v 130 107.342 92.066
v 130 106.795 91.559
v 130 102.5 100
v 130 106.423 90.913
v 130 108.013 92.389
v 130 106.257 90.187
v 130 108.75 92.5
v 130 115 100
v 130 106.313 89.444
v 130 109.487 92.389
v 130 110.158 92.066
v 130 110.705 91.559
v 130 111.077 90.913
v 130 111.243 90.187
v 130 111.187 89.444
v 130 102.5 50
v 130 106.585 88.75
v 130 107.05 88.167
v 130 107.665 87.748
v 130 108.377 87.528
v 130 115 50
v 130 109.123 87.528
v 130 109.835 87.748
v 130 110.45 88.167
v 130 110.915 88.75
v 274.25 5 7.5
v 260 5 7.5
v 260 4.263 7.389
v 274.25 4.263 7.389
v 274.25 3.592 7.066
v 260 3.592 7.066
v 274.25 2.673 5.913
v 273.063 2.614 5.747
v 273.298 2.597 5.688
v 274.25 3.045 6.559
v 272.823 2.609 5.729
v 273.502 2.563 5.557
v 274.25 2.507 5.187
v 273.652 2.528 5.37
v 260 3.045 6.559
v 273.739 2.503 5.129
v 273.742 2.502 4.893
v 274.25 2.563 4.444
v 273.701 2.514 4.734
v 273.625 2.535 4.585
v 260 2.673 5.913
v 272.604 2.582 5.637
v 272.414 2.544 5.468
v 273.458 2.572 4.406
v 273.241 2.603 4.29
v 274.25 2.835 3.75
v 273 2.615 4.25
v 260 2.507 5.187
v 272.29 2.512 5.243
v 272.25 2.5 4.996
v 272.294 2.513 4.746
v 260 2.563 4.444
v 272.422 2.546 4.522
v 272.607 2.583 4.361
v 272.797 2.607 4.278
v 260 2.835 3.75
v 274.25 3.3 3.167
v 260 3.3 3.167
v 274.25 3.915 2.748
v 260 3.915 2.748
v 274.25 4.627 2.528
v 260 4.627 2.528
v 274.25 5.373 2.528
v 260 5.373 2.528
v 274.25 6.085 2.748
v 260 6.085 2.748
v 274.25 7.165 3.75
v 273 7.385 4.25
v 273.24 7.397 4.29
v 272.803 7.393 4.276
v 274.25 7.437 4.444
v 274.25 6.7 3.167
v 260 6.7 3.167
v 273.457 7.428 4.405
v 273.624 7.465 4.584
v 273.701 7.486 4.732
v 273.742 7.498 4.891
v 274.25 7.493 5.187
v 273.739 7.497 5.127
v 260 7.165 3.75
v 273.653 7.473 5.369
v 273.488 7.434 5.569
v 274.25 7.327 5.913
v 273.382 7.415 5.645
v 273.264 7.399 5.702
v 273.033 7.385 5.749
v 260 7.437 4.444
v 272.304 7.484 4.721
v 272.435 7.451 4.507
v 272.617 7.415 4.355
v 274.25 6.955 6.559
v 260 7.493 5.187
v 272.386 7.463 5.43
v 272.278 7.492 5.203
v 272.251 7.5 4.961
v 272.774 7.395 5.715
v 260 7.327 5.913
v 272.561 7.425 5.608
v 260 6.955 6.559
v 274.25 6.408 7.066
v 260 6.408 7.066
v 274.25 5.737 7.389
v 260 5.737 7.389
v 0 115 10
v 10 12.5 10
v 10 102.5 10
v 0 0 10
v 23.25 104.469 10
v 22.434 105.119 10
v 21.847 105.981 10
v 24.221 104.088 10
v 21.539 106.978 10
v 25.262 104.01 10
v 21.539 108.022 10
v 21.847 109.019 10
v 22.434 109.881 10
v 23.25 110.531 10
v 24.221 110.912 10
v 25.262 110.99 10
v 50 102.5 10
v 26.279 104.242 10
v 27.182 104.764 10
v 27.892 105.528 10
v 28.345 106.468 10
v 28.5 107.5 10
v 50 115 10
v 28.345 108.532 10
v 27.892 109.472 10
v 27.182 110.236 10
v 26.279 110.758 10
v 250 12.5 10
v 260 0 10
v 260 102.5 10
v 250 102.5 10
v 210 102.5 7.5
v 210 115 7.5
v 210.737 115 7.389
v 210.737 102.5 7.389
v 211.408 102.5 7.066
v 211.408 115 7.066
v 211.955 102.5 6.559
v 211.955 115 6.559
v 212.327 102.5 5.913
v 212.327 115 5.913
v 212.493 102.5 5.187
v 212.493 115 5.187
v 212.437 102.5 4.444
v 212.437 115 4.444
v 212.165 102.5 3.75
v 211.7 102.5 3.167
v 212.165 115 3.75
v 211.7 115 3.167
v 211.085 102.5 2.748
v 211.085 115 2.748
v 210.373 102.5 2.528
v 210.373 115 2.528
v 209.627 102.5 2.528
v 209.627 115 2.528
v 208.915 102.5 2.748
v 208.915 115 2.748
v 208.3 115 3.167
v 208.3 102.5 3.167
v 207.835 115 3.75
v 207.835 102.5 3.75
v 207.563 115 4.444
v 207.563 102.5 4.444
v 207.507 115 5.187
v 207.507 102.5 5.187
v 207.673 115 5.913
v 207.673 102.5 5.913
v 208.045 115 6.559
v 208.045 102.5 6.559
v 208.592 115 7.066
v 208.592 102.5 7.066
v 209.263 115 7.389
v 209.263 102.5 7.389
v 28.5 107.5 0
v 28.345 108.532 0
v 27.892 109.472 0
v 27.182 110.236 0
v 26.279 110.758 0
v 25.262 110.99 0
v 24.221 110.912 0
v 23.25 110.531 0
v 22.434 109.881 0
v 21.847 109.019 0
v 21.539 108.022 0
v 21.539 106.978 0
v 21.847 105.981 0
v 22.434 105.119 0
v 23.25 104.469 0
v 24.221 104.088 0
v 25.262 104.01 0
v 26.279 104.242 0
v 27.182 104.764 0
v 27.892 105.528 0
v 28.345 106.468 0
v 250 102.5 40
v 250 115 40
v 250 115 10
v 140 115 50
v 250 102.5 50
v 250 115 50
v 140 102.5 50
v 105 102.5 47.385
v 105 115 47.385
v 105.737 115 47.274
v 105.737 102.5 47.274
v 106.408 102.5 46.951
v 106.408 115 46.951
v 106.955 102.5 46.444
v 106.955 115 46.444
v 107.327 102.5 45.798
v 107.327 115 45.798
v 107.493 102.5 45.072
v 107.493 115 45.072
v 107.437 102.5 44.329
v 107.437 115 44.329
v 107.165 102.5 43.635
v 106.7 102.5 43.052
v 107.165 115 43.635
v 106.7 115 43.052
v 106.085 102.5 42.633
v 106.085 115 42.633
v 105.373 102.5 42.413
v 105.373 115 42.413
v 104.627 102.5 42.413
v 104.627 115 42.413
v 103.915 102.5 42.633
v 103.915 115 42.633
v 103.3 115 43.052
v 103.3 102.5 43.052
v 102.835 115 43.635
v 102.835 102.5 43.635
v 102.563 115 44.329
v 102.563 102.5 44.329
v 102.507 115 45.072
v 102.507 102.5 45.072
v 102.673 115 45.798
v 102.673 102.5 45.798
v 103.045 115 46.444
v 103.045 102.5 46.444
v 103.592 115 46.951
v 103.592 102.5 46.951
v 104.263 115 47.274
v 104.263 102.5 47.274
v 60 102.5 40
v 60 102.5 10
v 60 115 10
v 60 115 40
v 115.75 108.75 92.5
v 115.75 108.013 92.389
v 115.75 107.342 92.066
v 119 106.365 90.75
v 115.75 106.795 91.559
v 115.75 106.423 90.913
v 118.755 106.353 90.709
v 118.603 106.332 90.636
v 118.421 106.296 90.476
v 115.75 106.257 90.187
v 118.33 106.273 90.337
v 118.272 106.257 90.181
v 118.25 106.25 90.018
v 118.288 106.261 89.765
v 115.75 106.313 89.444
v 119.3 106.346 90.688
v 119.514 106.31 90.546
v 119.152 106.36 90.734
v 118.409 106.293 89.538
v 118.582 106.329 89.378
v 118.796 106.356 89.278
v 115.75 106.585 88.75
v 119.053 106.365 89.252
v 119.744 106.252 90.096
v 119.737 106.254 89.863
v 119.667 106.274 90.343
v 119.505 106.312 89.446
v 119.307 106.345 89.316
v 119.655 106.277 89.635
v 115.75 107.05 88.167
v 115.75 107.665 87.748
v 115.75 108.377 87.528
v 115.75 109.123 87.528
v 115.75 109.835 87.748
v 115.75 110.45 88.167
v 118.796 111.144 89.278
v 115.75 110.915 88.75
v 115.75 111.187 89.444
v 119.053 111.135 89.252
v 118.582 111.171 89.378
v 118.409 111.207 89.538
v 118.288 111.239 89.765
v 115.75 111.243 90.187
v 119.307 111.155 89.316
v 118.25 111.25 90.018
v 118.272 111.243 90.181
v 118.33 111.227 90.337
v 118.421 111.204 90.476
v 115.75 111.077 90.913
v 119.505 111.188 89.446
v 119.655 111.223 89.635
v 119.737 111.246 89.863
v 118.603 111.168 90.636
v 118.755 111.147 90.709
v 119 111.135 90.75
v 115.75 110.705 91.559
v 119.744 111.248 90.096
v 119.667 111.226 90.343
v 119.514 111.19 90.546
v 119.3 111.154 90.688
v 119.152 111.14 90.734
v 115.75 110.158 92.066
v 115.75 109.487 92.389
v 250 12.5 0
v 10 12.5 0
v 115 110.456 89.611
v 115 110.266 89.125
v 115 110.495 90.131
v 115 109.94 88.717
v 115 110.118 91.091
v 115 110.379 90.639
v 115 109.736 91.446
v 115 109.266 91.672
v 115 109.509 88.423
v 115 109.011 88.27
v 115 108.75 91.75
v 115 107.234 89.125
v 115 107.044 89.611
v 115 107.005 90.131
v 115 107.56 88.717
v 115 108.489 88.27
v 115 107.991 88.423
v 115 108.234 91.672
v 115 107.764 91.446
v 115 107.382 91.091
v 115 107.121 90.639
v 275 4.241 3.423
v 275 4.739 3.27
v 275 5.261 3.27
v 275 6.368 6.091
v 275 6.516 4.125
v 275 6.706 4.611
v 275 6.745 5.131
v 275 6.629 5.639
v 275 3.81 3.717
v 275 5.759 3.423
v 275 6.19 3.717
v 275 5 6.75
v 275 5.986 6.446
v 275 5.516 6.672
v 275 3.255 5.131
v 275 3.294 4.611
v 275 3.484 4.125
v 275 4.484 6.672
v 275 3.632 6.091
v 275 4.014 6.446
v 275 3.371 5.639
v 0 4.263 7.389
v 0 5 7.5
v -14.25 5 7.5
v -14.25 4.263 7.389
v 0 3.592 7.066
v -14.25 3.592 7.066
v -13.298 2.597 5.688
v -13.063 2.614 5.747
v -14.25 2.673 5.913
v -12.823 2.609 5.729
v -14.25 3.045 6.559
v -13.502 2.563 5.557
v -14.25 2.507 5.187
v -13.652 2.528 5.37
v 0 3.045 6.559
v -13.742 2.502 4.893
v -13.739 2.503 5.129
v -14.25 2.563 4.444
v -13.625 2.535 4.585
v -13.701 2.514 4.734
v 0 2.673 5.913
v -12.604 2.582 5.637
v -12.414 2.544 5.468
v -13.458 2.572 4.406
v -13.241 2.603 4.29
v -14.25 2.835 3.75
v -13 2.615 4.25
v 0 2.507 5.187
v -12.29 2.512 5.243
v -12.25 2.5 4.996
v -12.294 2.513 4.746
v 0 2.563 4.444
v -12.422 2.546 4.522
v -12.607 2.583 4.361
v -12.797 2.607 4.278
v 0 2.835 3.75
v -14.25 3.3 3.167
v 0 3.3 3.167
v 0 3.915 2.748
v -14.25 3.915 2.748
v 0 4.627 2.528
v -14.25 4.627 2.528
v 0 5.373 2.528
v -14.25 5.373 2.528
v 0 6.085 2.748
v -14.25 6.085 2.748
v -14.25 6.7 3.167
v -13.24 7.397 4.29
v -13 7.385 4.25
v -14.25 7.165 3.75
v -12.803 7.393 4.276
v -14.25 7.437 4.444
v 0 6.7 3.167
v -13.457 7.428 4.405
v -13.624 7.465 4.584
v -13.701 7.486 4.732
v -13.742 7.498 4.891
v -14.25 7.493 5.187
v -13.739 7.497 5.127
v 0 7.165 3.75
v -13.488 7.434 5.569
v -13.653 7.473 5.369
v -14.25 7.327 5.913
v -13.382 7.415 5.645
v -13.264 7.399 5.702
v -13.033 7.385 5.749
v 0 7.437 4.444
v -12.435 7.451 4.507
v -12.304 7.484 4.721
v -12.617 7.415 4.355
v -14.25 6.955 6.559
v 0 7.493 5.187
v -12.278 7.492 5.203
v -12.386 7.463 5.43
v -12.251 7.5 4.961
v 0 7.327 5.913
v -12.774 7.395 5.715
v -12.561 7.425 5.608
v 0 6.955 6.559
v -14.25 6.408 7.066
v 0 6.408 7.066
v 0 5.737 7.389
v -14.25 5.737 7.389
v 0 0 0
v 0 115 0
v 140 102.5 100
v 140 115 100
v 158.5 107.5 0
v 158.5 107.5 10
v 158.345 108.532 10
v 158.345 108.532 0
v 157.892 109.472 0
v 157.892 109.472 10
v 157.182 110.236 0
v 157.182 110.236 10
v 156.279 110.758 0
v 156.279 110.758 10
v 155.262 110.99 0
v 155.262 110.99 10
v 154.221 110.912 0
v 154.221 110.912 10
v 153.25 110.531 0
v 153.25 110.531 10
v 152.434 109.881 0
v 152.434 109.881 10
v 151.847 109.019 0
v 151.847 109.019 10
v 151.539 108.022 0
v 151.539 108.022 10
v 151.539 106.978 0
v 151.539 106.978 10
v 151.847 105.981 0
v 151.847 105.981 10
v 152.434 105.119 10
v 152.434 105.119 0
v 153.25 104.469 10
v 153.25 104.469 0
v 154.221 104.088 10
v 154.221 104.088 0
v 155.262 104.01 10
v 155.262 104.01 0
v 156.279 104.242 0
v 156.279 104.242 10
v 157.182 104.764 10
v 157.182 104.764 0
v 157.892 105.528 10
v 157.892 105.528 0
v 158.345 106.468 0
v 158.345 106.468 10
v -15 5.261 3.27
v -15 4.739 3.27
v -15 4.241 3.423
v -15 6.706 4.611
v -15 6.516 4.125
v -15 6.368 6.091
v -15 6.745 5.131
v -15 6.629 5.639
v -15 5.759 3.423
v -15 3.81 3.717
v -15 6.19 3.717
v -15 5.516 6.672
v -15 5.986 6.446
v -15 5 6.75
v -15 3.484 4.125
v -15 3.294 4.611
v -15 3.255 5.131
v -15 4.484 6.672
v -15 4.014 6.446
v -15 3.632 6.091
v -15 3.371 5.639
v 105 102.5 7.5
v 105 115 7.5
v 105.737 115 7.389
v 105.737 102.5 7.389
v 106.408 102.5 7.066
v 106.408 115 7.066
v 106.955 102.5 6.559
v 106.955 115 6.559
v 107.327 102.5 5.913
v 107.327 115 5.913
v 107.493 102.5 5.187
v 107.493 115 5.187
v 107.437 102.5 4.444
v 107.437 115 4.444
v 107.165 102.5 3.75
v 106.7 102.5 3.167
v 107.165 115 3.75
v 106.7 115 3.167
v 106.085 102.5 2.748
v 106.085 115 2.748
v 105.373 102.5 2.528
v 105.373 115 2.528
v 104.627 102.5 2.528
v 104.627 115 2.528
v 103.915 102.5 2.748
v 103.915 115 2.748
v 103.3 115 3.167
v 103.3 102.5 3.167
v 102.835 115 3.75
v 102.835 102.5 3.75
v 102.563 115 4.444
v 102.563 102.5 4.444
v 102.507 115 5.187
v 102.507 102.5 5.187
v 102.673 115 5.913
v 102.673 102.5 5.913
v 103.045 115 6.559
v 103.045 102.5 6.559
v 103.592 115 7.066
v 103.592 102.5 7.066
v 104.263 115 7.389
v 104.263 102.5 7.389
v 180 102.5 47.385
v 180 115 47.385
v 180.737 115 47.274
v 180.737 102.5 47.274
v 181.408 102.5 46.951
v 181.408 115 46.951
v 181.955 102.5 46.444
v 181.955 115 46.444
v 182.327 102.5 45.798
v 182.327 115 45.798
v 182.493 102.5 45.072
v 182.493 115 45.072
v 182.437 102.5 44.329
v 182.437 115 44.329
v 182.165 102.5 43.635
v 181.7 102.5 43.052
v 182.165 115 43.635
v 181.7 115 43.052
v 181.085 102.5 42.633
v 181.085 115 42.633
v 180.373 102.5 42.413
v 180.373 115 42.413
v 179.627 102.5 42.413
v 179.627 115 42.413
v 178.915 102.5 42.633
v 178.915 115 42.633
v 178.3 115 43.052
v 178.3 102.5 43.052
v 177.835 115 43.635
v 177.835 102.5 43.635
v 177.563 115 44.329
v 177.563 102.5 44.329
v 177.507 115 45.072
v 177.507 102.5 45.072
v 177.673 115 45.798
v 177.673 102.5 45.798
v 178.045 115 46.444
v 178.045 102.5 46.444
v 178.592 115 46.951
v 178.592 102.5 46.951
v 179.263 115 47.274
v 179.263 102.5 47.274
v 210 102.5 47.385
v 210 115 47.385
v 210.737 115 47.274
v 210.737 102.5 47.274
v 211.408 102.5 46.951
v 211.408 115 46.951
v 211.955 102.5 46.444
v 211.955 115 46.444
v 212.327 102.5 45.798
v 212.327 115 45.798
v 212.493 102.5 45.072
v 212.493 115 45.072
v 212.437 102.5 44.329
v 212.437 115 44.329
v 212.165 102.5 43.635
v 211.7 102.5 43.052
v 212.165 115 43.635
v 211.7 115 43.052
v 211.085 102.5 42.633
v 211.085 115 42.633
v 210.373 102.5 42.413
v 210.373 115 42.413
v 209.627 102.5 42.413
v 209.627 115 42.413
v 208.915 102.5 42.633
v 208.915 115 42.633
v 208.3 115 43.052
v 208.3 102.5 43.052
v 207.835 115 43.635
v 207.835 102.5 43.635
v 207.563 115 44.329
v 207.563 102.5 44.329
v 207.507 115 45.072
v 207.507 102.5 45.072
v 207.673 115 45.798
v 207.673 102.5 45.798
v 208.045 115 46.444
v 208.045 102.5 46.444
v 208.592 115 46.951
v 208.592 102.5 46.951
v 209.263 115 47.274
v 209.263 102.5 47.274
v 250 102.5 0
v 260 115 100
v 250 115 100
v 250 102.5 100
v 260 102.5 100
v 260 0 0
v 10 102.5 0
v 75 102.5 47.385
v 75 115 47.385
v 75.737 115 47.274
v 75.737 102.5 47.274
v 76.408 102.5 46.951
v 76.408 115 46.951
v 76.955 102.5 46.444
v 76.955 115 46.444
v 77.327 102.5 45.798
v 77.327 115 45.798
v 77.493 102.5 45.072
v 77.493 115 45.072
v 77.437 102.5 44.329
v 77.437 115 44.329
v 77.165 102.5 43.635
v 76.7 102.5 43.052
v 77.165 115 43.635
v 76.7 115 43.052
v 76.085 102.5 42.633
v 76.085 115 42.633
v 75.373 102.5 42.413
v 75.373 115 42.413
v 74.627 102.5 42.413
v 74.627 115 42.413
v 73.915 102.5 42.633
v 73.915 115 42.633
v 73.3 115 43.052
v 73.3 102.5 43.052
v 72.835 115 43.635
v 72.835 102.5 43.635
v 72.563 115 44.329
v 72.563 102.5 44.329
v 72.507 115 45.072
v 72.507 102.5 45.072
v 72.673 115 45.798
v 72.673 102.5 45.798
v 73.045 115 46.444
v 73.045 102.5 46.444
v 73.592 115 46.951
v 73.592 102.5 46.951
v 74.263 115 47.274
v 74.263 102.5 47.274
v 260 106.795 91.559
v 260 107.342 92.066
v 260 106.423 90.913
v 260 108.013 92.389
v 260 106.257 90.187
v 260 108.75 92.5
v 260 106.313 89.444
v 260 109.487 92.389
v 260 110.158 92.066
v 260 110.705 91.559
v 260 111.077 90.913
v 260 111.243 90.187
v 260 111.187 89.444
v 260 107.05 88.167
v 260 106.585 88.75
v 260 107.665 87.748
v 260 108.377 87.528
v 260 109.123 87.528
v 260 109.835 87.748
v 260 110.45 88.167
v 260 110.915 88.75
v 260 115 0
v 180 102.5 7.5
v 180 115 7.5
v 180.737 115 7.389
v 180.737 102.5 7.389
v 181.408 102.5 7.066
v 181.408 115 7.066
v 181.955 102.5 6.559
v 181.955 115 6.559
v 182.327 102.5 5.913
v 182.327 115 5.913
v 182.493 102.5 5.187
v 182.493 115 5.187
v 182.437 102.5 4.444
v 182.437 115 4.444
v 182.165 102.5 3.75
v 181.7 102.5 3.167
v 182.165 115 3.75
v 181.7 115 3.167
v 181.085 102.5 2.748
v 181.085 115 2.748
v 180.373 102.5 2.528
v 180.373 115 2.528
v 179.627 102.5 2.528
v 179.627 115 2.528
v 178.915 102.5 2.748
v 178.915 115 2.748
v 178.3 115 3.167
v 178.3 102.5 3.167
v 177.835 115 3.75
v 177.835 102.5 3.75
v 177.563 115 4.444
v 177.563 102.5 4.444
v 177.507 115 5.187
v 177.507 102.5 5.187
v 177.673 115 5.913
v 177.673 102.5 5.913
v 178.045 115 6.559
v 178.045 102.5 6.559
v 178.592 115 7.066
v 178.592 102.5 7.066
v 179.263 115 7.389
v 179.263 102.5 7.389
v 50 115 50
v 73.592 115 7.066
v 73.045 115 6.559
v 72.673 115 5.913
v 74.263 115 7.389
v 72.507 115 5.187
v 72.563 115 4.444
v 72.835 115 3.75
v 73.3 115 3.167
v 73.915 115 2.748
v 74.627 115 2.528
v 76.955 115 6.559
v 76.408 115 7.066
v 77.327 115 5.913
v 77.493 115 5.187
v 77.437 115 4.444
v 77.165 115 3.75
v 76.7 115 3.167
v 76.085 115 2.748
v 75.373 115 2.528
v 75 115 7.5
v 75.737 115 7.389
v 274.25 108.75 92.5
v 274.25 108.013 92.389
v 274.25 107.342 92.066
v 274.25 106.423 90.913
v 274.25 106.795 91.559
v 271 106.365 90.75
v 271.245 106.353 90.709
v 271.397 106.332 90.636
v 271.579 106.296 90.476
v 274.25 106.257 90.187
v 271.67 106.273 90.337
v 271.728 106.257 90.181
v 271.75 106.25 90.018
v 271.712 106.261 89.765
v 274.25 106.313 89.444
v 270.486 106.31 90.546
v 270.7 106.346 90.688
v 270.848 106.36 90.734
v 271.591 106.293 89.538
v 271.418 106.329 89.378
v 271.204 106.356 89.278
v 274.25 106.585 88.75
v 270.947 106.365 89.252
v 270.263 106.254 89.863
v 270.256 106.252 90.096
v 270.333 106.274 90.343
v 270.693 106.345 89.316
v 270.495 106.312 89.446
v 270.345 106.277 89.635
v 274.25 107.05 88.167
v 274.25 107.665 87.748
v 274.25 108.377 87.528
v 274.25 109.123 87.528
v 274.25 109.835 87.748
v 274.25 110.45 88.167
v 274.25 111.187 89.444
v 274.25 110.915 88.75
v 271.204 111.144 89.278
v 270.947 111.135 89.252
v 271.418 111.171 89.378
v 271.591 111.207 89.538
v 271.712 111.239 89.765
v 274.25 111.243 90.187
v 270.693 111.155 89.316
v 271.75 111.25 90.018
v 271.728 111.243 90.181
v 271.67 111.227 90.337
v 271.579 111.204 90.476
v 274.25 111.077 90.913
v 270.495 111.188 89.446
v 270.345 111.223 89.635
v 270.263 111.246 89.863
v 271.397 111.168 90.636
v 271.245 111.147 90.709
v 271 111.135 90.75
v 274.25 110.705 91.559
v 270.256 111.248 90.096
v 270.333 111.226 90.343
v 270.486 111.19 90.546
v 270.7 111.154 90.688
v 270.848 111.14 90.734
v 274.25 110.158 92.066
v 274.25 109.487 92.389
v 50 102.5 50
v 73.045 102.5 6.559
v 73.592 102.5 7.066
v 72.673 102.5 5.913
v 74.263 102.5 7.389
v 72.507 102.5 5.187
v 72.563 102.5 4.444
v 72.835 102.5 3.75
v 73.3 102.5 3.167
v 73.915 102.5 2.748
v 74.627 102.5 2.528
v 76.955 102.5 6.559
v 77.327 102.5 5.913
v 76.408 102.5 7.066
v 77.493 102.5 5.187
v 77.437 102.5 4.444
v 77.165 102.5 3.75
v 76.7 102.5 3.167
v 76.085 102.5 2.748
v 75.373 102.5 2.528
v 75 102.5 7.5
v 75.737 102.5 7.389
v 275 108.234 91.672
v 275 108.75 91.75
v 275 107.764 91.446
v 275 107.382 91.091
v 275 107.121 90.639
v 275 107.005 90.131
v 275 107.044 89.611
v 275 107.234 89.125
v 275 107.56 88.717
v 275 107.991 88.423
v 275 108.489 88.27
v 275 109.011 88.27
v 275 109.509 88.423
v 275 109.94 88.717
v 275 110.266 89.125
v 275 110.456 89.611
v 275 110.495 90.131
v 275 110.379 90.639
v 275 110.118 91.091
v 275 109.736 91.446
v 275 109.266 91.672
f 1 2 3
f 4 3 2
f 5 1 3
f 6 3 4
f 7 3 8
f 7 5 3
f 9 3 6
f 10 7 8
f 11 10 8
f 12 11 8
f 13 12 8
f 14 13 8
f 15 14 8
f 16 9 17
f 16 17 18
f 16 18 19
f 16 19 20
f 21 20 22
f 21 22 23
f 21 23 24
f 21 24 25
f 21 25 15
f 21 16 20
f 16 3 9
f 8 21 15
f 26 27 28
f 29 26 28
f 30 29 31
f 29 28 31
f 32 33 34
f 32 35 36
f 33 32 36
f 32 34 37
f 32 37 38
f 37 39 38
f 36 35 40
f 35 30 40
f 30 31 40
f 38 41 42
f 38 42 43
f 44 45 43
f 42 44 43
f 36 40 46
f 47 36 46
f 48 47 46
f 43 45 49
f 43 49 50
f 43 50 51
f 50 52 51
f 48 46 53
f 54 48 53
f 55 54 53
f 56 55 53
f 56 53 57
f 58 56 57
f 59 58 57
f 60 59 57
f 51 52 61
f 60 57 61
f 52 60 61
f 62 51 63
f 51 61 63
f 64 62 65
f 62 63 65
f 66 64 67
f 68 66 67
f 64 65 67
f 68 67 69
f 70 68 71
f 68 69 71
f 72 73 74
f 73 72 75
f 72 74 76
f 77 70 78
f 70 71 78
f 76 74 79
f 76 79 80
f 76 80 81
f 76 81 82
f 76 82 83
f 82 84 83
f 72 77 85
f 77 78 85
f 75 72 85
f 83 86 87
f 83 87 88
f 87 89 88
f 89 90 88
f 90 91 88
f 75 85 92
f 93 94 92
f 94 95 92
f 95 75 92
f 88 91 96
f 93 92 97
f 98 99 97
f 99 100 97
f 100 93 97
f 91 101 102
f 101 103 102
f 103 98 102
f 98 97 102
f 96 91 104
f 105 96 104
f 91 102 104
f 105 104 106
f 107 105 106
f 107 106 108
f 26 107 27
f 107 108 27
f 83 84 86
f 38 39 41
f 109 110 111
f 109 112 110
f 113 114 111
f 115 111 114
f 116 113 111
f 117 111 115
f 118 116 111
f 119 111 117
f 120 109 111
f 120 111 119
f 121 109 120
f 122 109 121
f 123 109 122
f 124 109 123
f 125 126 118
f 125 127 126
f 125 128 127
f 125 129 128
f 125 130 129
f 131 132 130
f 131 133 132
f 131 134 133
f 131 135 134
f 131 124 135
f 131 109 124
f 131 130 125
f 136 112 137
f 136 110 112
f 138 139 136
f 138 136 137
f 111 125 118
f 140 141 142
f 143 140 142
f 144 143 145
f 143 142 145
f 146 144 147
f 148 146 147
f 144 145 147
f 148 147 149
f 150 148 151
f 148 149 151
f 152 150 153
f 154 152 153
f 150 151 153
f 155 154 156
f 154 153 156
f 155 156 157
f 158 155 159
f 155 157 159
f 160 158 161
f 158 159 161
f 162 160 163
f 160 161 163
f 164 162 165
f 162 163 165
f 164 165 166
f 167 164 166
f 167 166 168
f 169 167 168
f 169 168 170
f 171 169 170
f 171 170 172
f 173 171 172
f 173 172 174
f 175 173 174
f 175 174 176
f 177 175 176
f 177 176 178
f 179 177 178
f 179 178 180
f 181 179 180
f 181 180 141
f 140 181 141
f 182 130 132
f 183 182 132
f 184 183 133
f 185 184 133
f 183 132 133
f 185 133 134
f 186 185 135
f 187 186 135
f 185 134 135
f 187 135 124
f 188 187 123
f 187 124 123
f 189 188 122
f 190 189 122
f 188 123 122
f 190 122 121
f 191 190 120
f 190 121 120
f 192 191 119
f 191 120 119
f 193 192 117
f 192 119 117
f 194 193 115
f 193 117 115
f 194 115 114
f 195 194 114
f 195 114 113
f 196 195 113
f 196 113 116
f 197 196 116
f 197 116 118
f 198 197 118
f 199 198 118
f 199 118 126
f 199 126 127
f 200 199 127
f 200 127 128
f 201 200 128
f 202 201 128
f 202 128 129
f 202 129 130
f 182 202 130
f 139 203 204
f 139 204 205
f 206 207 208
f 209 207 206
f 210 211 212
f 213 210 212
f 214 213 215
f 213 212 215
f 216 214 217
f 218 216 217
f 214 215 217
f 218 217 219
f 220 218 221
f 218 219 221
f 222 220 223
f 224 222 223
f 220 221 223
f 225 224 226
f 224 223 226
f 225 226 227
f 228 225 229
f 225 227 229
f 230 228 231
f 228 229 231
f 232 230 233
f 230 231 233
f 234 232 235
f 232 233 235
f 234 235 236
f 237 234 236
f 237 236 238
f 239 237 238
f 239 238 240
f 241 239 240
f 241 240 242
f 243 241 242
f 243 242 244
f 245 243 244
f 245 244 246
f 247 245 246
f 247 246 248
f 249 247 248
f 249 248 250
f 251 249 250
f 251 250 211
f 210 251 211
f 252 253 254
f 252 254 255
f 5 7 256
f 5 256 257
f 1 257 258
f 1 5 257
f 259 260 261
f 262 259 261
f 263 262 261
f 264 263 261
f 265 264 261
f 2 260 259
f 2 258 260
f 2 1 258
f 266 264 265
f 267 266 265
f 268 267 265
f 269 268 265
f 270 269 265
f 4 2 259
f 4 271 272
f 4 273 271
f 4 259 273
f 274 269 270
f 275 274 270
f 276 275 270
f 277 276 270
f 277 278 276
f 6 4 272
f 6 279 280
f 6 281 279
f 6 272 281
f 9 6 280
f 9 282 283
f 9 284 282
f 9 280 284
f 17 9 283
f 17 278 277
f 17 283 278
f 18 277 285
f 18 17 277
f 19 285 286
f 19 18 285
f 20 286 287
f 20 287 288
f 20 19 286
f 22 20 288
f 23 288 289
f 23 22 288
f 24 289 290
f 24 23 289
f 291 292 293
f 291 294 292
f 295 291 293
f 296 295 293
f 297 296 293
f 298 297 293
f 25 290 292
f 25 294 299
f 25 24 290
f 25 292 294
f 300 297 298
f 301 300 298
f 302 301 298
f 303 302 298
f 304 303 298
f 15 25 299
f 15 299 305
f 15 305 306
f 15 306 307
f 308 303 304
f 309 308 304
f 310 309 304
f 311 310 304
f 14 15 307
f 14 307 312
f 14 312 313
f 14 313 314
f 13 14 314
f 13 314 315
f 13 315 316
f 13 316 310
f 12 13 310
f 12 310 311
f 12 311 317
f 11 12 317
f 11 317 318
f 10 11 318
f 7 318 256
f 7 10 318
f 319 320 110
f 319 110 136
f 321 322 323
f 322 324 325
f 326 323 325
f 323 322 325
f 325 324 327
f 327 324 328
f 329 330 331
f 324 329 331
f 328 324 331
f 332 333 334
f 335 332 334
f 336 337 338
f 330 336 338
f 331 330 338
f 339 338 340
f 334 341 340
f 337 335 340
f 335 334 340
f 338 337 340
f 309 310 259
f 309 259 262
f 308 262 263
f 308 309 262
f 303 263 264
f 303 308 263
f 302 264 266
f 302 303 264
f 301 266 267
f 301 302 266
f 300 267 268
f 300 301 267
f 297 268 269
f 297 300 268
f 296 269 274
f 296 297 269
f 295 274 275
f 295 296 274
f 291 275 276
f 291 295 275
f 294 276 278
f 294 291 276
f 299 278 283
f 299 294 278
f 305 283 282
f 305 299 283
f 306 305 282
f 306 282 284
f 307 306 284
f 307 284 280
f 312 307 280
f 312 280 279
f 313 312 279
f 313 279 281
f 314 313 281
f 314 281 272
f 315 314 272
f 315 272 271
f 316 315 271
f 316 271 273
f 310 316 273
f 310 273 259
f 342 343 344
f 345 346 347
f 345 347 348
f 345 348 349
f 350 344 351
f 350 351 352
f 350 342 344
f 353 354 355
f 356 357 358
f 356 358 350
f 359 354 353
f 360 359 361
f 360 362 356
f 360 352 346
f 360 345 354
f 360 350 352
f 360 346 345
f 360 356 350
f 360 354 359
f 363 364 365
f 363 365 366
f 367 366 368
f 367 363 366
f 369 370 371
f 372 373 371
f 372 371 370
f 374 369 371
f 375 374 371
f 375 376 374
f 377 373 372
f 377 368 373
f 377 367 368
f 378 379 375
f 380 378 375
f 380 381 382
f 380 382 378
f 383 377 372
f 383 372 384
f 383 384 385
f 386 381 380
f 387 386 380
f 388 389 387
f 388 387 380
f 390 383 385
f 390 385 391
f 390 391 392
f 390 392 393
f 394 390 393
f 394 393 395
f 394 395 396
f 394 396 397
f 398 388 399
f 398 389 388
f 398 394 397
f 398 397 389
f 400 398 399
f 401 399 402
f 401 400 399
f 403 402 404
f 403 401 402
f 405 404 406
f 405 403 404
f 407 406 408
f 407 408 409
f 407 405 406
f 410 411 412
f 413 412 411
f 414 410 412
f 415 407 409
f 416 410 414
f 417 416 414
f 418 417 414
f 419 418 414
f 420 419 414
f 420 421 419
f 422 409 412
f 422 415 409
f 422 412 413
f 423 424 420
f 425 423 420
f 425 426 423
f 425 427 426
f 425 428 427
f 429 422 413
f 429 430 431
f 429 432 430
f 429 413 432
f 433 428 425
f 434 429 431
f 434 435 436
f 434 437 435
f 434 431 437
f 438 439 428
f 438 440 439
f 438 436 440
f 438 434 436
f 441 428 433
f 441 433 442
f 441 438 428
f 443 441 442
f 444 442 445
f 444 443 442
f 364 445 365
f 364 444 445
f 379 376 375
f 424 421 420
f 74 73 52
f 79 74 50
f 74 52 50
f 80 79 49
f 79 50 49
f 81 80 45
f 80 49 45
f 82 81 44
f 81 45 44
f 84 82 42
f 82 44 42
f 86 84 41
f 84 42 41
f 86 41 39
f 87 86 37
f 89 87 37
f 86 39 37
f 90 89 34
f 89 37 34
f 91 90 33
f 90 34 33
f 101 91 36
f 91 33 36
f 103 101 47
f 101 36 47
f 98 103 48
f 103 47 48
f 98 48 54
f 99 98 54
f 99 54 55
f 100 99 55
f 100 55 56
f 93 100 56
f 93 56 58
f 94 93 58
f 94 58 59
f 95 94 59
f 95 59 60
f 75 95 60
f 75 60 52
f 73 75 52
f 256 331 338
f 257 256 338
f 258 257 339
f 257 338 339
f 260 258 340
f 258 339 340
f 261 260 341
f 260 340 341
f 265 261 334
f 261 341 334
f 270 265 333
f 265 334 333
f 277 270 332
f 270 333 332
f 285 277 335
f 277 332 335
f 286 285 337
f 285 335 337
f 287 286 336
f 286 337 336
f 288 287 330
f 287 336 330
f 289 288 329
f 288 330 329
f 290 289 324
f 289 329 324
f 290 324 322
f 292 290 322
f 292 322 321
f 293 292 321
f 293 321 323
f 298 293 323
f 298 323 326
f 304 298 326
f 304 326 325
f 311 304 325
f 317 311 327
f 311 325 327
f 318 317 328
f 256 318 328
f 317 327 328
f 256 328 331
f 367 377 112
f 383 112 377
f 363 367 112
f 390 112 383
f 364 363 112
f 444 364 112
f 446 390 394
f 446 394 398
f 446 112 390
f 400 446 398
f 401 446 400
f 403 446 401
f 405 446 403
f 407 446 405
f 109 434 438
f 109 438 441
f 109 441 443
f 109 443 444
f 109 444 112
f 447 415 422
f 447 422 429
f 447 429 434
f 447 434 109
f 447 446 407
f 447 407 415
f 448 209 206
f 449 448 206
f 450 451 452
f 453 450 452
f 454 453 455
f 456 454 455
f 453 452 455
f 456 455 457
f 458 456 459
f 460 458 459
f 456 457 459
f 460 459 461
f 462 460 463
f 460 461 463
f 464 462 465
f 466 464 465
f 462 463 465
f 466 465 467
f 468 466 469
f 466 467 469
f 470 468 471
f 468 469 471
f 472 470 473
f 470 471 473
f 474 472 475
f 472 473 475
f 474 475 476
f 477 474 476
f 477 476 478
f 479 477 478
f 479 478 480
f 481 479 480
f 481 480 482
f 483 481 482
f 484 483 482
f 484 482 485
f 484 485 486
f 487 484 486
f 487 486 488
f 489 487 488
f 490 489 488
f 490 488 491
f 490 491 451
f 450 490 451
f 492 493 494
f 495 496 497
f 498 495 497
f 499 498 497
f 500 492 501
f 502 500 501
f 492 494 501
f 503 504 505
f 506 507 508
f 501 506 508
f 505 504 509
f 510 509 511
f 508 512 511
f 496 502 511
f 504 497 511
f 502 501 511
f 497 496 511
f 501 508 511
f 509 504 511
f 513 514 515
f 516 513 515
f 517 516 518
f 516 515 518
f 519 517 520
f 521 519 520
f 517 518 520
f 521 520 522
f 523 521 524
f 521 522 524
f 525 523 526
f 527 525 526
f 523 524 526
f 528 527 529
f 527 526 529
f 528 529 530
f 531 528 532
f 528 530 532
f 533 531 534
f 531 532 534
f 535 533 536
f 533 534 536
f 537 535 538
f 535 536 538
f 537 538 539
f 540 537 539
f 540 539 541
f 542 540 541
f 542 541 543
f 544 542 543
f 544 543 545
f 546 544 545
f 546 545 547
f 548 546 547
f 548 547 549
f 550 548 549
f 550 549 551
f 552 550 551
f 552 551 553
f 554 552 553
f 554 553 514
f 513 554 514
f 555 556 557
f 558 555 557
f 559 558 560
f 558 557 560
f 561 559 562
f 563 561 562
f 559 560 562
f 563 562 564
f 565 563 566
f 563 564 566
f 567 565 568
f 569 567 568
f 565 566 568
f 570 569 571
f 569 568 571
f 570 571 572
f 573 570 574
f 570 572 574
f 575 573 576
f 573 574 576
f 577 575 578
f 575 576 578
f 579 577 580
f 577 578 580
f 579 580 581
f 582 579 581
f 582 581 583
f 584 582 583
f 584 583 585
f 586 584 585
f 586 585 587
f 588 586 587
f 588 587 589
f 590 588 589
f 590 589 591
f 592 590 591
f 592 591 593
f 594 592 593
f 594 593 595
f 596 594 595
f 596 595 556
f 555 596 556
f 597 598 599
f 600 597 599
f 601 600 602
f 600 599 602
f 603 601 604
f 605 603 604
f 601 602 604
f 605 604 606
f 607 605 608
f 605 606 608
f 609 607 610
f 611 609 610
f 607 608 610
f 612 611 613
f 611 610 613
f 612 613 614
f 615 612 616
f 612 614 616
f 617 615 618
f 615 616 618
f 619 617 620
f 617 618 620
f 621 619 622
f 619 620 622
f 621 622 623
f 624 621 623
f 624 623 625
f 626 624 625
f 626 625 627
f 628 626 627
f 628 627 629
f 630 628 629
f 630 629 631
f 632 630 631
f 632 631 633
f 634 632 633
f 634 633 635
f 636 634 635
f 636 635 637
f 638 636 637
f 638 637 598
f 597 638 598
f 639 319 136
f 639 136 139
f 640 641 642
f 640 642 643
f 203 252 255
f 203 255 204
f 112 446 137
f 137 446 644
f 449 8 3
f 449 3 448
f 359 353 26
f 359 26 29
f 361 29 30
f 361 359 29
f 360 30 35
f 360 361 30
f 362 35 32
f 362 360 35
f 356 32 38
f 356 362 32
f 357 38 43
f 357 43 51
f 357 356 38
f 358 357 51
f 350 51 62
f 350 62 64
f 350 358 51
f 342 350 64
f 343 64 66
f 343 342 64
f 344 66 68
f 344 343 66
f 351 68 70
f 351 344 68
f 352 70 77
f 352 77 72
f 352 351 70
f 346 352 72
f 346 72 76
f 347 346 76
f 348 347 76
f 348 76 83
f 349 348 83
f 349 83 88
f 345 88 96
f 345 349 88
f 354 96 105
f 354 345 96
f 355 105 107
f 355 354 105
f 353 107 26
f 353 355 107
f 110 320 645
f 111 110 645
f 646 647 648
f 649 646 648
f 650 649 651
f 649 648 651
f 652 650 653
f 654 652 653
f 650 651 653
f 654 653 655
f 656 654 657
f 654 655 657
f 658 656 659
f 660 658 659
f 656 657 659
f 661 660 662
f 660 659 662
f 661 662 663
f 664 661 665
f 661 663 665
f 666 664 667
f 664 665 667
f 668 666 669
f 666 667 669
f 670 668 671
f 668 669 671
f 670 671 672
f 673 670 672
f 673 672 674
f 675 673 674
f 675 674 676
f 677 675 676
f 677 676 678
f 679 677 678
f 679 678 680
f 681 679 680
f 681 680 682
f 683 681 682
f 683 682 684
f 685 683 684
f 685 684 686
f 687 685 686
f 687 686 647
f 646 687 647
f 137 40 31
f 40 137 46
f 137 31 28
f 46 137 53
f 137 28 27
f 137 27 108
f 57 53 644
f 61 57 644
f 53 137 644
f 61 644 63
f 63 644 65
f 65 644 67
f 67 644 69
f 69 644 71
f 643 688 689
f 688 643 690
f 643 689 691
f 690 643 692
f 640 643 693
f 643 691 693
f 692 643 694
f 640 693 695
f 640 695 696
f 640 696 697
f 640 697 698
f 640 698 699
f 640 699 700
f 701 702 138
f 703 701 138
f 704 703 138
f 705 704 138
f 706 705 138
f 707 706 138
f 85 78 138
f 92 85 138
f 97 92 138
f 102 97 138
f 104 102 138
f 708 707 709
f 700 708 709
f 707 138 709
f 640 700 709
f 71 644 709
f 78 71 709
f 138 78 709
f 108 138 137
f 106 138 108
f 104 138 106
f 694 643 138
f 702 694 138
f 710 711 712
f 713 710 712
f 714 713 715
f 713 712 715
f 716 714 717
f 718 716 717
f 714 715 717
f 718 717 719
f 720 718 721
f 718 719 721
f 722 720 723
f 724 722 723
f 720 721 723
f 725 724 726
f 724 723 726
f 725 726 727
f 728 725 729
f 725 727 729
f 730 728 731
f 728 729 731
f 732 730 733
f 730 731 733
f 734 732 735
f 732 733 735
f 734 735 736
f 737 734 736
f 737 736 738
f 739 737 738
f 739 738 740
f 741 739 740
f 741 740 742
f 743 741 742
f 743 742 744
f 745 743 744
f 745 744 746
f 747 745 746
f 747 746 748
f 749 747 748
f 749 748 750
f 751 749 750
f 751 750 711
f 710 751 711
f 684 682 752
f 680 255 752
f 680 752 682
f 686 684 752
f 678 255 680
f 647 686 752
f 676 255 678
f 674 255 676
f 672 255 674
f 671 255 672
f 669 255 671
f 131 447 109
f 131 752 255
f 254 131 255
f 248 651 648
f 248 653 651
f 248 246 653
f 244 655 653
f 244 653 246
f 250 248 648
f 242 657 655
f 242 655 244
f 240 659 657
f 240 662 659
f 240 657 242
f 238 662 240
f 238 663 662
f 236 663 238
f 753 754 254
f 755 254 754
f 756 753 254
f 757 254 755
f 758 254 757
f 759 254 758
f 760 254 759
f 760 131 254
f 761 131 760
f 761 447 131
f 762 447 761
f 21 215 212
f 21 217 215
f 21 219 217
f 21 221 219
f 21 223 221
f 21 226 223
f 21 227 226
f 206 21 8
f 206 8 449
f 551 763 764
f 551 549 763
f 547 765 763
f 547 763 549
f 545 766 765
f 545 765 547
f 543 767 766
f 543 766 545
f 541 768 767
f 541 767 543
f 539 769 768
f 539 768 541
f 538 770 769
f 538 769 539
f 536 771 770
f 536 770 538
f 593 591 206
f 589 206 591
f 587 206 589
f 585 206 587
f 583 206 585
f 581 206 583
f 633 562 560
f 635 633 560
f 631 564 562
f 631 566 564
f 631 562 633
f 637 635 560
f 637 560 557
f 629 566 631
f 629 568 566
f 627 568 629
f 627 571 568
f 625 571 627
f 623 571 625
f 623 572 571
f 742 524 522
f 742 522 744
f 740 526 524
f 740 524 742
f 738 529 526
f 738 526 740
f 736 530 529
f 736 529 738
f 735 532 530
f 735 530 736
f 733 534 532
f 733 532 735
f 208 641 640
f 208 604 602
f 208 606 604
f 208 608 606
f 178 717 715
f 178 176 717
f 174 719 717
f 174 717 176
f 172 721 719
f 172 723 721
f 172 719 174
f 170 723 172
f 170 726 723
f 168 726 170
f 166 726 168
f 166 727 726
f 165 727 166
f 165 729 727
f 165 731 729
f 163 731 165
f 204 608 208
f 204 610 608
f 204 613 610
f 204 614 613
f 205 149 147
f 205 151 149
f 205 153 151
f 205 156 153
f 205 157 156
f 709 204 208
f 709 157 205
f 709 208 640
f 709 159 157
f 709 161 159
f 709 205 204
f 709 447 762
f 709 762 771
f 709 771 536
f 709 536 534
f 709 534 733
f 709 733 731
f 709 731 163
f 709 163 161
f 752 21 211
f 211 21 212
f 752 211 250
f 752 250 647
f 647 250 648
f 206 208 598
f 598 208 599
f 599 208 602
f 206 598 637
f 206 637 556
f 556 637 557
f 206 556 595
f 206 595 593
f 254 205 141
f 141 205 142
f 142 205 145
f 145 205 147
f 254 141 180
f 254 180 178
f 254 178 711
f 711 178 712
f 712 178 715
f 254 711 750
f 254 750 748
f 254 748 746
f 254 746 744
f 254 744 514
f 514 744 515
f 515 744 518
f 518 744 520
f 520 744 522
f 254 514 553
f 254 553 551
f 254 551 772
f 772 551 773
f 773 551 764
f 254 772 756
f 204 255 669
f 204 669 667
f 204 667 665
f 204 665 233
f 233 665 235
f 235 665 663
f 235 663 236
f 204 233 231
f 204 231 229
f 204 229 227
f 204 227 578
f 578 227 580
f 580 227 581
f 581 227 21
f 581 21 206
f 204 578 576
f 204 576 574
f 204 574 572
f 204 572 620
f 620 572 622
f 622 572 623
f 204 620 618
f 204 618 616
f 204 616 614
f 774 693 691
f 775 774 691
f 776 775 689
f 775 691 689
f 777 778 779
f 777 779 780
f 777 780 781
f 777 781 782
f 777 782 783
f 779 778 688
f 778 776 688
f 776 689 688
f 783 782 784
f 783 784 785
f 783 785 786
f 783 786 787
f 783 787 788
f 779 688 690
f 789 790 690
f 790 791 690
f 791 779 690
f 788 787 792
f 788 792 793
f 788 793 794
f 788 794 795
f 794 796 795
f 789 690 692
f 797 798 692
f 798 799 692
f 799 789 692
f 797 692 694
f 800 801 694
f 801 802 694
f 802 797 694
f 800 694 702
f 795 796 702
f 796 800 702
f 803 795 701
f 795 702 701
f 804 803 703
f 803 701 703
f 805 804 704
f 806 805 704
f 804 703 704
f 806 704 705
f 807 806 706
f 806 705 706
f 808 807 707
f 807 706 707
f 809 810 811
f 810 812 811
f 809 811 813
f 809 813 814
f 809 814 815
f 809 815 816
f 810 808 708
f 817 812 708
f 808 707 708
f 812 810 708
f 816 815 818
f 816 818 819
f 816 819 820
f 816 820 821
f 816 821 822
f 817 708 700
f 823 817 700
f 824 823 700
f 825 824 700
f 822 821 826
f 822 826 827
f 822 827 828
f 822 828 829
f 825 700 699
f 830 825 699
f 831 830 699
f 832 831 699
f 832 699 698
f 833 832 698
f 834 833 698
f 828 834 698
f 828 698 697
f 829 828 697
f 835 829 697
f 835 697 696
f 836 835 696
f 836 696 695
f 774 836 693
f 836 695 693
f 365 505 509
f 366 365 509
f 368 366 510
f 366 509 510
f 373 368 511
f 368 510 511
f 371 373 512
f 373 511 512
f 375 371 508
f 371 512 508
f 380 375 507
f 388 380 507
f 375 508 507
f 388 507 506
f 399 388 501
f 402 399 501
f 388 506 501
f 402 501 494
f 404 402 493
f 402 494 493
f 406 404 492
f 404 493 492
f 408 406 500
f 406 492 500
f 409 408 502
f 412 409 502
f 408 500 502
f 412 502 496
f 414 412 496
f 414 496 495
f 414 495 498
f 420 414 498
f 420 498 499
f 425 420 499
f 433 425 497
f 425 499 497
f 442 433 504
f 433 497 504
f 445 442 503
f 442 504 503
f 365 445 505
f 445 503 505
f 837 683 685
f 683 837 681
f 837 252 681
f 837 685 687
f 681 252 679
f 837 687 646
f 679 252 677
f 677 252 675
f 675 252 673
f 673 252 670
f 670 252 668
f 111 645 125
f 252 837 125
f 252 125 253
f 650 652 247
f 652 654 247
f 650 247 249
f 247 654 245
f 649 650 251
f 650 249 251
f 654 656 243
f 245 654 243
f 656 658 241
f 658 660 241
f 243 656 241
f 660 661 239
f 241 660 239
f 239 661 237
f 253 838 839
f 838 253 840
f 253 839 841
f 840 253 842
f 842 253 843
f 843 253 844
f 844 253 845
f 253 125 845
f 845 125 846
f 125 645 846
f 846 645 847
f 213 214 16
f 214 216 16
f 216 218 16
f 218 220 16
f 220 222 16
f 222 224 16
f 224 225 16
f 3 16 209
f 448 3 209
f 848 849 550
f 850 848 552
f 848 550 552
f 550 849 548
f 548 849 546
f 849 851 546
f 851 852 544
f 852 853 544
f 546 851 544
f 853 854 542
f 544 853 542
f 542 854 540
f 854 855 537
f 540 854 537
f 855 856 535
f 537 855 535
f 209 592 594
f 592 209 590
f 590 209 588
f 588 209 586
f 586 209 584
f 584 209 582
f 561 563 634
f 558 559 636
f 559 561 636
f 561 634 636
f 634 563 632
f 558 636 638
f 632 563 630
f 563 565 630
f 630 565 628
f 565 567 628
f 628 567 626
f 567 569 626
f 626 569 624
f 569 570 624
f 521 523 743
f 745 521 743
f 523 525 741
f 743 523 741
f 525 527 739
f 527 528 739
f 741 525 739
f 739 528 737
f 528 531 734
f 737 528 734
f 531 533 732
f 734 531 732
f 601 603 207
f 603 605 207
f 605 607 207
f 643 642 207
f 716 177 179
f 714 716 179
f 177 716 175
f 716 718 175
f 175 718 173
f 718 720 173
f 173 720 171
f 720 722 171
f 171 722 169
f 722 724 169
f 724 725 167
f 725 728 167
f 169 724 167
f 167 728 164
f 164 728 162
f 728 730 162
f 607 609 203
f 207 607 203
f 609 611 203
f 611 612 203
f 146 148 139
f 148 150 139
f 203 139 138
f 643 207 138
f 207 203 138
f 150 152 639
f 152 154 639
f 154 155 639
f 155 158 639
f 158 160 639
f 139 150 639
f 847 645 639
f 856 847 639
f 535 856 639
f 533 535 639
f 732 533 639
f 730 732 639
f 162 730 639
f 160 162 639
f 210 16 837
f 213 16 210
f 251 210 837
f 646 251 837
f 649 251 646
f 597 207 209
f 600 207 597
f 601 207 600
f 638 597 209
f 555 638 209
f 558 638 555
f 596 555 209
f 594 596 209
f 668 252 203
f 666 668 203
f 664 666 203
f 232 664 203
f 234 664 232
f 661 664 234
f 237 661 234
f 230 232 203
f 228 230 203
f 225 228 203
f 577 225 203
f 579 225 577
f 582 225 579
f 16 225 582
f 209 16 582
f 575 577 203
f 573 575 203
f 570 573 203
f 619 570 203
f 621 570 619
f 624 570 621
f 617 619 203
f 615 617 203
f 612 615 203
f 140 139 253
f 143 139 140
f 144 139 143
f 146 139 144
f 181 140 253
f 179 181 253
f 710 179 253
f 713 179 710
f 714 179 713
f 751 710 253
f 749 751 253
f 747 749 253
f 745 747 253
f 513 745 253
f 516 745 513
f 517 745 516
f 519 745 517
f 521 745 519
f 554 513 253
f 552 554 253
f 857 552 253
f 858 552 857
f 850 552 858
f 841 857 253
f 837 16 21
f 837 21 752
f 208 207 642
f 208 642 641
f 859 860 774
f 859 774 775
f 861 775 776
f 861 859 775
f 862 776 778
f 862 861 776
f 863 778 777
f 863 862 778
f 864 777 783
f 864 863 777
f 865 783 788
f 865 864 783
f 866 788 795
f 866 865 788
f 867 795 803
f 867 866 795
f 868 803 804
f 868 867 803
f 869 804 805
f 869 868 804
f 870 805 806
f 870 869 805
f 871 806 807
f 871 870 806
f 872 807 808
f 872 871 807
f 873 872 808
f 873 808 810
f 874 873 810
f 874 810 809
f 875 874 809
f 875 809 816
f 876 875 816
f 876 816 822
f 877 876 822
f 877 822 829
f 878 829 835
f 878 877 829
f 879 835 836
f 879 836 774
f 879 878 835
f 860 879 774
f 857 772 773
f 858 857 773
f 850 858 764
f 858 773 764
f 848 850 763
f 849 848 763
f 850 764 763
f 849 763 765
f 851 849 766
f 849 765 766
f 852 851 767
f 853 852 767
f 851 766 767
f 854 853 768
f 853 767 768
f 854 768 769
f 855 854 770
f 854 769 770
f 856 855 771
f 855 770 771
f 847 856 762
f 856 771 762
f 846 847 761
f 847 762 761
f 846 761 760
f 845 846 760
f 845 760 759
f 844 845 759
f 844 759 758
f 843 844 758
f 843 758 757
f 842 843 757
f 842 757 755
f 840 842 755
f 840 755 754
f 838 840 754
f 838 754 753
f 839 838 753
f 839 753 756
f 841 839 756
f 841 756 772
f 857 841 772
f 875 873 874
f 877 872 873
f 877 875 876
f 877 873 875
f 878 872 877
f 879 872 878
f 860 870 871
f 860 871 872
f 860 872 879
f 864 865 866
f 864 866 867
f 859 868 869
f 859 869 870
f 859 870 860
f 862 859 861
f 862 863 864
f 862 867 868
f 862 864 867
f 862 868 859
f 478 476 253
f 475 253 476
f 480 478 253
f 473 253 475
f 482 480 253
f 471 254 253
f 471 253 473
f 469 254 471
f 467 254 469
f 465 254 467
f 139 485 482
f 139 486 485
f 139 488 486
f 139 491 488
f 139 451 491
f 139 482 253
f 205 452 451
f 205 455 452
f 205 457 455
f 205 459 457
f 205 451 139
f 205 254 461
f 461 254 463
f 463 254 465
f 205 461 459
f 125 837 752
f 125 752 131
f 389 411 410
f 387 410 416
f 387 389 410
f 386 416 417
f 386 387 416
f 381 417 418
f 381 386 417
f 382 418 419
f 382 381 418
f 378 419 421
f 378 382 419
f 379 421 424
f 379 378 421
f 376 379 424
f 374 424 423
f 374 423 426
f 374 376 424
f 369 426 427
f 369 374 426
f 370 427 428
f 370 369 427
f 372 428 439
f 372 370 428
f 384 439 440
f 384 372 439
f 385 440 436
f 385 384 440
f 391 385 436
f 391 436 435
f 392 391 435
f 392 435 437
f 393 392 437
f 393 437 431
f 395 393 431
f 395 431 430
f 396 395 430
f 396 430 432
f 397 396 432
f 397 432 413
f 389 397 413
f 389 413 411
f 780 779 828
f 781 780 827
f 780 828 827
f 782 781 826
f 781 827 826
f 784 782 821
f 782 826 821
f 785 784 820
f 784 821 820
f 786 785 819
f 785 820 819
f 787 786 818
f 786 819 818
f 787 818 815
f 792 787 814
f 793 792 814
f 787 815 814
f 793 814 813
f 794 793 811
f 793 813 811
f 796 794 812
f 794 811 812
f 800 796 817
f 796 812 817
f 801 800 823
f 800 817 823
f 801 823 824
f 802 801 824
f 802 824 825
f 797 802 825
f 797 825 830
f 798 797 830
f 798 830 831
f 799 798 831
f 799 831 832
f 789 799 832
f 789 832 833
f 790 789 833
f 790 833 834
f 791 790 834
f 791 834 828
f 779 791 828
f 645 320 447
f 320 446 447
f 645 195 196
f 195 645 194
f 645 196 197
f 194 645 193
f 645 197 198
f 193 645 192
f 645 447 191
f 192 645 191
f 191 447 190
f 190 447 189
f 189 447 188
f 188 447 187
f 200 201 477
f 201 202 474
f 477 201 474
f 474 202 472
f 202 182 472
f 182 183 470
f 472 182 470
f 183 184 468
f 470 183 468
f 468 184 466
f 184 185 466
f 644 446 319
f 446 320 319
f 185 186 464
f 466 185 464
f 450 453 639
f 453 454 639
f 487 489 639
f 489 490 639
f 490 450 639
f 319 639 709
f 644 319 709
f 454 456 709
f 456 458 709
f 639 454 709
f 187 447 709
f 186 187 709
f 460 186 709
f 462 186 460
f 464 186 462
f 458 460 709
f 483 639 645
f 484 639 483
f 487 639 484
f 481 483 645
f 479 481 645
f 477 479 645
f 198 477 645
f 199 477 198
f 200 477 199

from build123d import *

# Parameters (mm, degrees)
IZIM1_W                     = 260
IZIM1_H                     = 115
IZIM1_W_2                   = 240
IZIM1_H_2                   = 90
Y_KSEKLIK_EKSTR_ZYON1_DEPTH = 10
Y_KSEKLIK_EKSTR_ZYON2_START = -12.5
Y_KSEKLIK_EKSTR_ZYON2_DEPTH = 12.5
IZIM3_W                     = 10
IZIM3_H                     = 12.5
Y_KSEKLIK_EKSTR_ZYON3_DEPTH = 50
IZIM4_R                     = 2.5
Y_KSEKLIK_EKSTR_ZYON4_DEPTH = 15
IZIM5_R                     = 0.75
KES_EKSTR_ZYON1_DEPTH       = 15
PAH1_SIZE                   = 0.75
IZIM6_R                     = 2.5
Y_KSEKLIK_EKSTR_ZYON5_DEPTH = 15
IZIM7_R                     = 0.75
KES_EKSTR_ZYON2_DEPTH       = 15
PAH2_SIZE                   = 0.75
PAH3_SIZE                   = 0.75
IZIM8_R                     = 2.5
KES_EKSTR_ZYON3_DEPTH       = 15
IZIM9_R                     = 3.5
KES_EKSTR_ZYON4_DEPTH       = 15


with BuildPart() as part:
    # Çizim1 → Yükseklik-Ekstrüzyon1 (new body)
    with BuildSketch(Plane.XY):
        with Locations((130, 57.5)):
            Rectangle(IZIM1_W, IZIM1_H)
        with Locations((130, 57.5)):
            Rectangle(IZIM1_W_2, IZIM1_H_2, mode=Mode.SUBTRACT)
    extrude(amount=Y_KSEKLIK_EKSTR_ZYON1_DEPTH)

    # Çizim2 → Yükseklik-Ekstrüzyon2 (add)
    with BuildSketch(Plane(origin=(0, 115, 0), x_dir=(1, 0, 0), z_dir=(0, 1, 0)).offset(Y_KSEKLIK_EKSTR_ZYON2_START)):
        Polygon((260, -10), (260, -50), (50, -50), (50, -10), (60, -10), (60, -40), (250, -40), (250, -10), align=None)
    extrude(amount=Y_KSEKLIK_EKSTR_ZYON2_DEPTH)

    # Çizim3 → Yükseklik-Ekstrüzyon3 (add)
    with BuildSketch(Plane.XY.offset(50)):
        with Locations((255, 108.75)):
            Rectangle(IZIM3_W, IZIM3_H)
        with Locations((135, 108.75)):
            Rectangle(IZIM3_W, IZIM3_H)
    extrude(amount=Y_KSEKLIK_EKSTR_ZYON3_DEPTH)

    # Çizim4 → Yükseklik-Ekstrüzyon4 (add)
    with BuildSketch(Plane(origin=(260, 0, 0), x_dir=(0, 0, -1), z_dir=(1, 0, 0))):
        with Locations(Location((-90, 108.75, 0), (0, 0, 180))):
            Circle(IZIM4_R)
    y_kseklik_ekstr_zyon4 = extrude(amount=Y_KSEKLIK_EKSTR_ZYON4_DEPTH)

    # Çizim5 → Kes-Ekstrüzyon1 (cut)
    with BuildSketch(Plane(origin=(0, 115, 0), x_dir=(1, 0, 0), z_dir=(0, 1, 0))):
        with Locations(Location((271, -90, 0), (0, 0, 270))):
            Circle(IZIM5_R)
    kes_ekstr_zyon1 = extrude(amount=-KES_EKSTR_ZYON1_DEPTH, mode=Mode.SUBTRACT)

    # Aynalama1: Yükseklik-Ekstrüzyon4, Kes-Ekstrüzyon1 across plane
    add(y_kseklik_ekstr_zyon4.mirror(Plane(origin=(195, 0, 0), x_dir=(0, 0, 1), z_dir=(1, 0, 0))))
    add(kes_ekstr_zyon1.mirror(Plane(origin=(195, 0, 0), x_dir=(0, 0, 1), z_dir=(1, 0, 0))), mode=Mode.SUBTRACT)

    # Pah1
    pah1_edges = [part.edges().sort_by_distance(p)[0] for p in [
        (275, 108.75, 87.5),
        (115, 108.75, 87.5),
    ]]
    chamfer(pah1_edges, length=PAH1_SIZE)

    # Çizim6 → Yükseklik-Ekstrüzyon5 (add)
    with BuildSketch(Plane(origin=(260, 0, 0), x_dir=(0, 0, -1), z_dir=(1, 0, 0))):
        with Locations(Location((-5, 5, 0), (0, 0, 180))):
            Circle(IZIM6_R)
    y_kseklik_ekstr_zyon5 = extrude(amount=Y_KSEKLIK_EKSTR_ZYON5_DEPTH)

    # Çizim7 → Kes-Ekstrüzyon2 (cut)
    with BuildSketch(Plane.XZ):
        with Locations(Location((273, 5, 0), (0, 0, 270))):
            Circle(IZIM7_R)
    kes_ekstr_zyon2 = extrude(amount=-KES_EKSTR_ZYON2_DEPTH, mode=Mode.SUBTRACT)

    # Pah2
    pah2_edges = [part.edges().sort_by_distance(p)[0] for p in [
        (275, 5, 2.5),
    ]]
    chamfer(pah2_edges, length=PAH2_SIZE)

    # Aynalama5: Yükseklik-Ekstrüzyon5, Kes-Ekstrüzyon2 across plane
    add(y_kseklik_ekstr_zyon5.mirror(Plane(origin=(130, 0, 0), x_dir=(0, 0, 1), z_dir=(1, 0, 0))))
    add(kes_ekstr_zyon2.mirror(Plane(origin=(130, 0, 0), x_dir=(0, 0, 1), z_dir=(1, 0, 0))), mode=Mode.SUBTRACT)

    # Pah3
    pah3_edges = [part.edges().sort_by_distance(p)[0] for p in [
        (-15, 5, 2.5),
    ]]
    chamfer(pah3_edges, length=PAH3_SIZE)

    # Çizim8 → Kes-Ekstrüzyon3 (cut)
    with BuildSketch(Plane(origin=(0, 115, 0), x_dir=(1, 0, 0), z_dir=(0, 1, 0))):
        with Locations(Location((210, -5, 0), (0, 0, 270))):
            Circle(IZIM8_R)
        with Locations(Location((180, -5, 0), (0, 0, 270))):
            Circle(IZIM8_R)
        with Locations(Location((105, -5, 0), (0, 0, 270))):
            Circle(IZIM8_R)
        with Locations(Location((75, -5, 0), (0, 0, 270))):
            Circle(IZIM8_R)
        with Locations(Location((75, -44.884971075, 0), (0, 0, 270))):
            Circle(IZIM8_R)
        with Locations(Location((105, -44.884971075, 0), (0, 0, 270))):
            Circle(IZIM8_R)
        with Locations(Location((180, -44.884971075, 0), (0, 0, 270))):
            Circle(IZIM8_R)
        with Locations(Location((210, -44.884971075, 0), (0, 0, 270))):
            Circle(IZIM8_R)
    extrude(amount=-KES_EKSTR_ZYON3_DEPTH, mode=Mode.SUBTRACT)

    # Çizim9 → Kes-Ekstrüzyon4 (cut)
    with BuildSketch(Plane.XY.offset(10)):
        with Locations((155, 107.5)):
            Circle(IZIM9_R)
        with Locations((25, 107.5)):
            Circle(IZIM9_R)
    extrude(amount=-KES_EKSTR_ZYON4_DEPTH, mode=Mode.SUBTRACT)


solid = part.part
